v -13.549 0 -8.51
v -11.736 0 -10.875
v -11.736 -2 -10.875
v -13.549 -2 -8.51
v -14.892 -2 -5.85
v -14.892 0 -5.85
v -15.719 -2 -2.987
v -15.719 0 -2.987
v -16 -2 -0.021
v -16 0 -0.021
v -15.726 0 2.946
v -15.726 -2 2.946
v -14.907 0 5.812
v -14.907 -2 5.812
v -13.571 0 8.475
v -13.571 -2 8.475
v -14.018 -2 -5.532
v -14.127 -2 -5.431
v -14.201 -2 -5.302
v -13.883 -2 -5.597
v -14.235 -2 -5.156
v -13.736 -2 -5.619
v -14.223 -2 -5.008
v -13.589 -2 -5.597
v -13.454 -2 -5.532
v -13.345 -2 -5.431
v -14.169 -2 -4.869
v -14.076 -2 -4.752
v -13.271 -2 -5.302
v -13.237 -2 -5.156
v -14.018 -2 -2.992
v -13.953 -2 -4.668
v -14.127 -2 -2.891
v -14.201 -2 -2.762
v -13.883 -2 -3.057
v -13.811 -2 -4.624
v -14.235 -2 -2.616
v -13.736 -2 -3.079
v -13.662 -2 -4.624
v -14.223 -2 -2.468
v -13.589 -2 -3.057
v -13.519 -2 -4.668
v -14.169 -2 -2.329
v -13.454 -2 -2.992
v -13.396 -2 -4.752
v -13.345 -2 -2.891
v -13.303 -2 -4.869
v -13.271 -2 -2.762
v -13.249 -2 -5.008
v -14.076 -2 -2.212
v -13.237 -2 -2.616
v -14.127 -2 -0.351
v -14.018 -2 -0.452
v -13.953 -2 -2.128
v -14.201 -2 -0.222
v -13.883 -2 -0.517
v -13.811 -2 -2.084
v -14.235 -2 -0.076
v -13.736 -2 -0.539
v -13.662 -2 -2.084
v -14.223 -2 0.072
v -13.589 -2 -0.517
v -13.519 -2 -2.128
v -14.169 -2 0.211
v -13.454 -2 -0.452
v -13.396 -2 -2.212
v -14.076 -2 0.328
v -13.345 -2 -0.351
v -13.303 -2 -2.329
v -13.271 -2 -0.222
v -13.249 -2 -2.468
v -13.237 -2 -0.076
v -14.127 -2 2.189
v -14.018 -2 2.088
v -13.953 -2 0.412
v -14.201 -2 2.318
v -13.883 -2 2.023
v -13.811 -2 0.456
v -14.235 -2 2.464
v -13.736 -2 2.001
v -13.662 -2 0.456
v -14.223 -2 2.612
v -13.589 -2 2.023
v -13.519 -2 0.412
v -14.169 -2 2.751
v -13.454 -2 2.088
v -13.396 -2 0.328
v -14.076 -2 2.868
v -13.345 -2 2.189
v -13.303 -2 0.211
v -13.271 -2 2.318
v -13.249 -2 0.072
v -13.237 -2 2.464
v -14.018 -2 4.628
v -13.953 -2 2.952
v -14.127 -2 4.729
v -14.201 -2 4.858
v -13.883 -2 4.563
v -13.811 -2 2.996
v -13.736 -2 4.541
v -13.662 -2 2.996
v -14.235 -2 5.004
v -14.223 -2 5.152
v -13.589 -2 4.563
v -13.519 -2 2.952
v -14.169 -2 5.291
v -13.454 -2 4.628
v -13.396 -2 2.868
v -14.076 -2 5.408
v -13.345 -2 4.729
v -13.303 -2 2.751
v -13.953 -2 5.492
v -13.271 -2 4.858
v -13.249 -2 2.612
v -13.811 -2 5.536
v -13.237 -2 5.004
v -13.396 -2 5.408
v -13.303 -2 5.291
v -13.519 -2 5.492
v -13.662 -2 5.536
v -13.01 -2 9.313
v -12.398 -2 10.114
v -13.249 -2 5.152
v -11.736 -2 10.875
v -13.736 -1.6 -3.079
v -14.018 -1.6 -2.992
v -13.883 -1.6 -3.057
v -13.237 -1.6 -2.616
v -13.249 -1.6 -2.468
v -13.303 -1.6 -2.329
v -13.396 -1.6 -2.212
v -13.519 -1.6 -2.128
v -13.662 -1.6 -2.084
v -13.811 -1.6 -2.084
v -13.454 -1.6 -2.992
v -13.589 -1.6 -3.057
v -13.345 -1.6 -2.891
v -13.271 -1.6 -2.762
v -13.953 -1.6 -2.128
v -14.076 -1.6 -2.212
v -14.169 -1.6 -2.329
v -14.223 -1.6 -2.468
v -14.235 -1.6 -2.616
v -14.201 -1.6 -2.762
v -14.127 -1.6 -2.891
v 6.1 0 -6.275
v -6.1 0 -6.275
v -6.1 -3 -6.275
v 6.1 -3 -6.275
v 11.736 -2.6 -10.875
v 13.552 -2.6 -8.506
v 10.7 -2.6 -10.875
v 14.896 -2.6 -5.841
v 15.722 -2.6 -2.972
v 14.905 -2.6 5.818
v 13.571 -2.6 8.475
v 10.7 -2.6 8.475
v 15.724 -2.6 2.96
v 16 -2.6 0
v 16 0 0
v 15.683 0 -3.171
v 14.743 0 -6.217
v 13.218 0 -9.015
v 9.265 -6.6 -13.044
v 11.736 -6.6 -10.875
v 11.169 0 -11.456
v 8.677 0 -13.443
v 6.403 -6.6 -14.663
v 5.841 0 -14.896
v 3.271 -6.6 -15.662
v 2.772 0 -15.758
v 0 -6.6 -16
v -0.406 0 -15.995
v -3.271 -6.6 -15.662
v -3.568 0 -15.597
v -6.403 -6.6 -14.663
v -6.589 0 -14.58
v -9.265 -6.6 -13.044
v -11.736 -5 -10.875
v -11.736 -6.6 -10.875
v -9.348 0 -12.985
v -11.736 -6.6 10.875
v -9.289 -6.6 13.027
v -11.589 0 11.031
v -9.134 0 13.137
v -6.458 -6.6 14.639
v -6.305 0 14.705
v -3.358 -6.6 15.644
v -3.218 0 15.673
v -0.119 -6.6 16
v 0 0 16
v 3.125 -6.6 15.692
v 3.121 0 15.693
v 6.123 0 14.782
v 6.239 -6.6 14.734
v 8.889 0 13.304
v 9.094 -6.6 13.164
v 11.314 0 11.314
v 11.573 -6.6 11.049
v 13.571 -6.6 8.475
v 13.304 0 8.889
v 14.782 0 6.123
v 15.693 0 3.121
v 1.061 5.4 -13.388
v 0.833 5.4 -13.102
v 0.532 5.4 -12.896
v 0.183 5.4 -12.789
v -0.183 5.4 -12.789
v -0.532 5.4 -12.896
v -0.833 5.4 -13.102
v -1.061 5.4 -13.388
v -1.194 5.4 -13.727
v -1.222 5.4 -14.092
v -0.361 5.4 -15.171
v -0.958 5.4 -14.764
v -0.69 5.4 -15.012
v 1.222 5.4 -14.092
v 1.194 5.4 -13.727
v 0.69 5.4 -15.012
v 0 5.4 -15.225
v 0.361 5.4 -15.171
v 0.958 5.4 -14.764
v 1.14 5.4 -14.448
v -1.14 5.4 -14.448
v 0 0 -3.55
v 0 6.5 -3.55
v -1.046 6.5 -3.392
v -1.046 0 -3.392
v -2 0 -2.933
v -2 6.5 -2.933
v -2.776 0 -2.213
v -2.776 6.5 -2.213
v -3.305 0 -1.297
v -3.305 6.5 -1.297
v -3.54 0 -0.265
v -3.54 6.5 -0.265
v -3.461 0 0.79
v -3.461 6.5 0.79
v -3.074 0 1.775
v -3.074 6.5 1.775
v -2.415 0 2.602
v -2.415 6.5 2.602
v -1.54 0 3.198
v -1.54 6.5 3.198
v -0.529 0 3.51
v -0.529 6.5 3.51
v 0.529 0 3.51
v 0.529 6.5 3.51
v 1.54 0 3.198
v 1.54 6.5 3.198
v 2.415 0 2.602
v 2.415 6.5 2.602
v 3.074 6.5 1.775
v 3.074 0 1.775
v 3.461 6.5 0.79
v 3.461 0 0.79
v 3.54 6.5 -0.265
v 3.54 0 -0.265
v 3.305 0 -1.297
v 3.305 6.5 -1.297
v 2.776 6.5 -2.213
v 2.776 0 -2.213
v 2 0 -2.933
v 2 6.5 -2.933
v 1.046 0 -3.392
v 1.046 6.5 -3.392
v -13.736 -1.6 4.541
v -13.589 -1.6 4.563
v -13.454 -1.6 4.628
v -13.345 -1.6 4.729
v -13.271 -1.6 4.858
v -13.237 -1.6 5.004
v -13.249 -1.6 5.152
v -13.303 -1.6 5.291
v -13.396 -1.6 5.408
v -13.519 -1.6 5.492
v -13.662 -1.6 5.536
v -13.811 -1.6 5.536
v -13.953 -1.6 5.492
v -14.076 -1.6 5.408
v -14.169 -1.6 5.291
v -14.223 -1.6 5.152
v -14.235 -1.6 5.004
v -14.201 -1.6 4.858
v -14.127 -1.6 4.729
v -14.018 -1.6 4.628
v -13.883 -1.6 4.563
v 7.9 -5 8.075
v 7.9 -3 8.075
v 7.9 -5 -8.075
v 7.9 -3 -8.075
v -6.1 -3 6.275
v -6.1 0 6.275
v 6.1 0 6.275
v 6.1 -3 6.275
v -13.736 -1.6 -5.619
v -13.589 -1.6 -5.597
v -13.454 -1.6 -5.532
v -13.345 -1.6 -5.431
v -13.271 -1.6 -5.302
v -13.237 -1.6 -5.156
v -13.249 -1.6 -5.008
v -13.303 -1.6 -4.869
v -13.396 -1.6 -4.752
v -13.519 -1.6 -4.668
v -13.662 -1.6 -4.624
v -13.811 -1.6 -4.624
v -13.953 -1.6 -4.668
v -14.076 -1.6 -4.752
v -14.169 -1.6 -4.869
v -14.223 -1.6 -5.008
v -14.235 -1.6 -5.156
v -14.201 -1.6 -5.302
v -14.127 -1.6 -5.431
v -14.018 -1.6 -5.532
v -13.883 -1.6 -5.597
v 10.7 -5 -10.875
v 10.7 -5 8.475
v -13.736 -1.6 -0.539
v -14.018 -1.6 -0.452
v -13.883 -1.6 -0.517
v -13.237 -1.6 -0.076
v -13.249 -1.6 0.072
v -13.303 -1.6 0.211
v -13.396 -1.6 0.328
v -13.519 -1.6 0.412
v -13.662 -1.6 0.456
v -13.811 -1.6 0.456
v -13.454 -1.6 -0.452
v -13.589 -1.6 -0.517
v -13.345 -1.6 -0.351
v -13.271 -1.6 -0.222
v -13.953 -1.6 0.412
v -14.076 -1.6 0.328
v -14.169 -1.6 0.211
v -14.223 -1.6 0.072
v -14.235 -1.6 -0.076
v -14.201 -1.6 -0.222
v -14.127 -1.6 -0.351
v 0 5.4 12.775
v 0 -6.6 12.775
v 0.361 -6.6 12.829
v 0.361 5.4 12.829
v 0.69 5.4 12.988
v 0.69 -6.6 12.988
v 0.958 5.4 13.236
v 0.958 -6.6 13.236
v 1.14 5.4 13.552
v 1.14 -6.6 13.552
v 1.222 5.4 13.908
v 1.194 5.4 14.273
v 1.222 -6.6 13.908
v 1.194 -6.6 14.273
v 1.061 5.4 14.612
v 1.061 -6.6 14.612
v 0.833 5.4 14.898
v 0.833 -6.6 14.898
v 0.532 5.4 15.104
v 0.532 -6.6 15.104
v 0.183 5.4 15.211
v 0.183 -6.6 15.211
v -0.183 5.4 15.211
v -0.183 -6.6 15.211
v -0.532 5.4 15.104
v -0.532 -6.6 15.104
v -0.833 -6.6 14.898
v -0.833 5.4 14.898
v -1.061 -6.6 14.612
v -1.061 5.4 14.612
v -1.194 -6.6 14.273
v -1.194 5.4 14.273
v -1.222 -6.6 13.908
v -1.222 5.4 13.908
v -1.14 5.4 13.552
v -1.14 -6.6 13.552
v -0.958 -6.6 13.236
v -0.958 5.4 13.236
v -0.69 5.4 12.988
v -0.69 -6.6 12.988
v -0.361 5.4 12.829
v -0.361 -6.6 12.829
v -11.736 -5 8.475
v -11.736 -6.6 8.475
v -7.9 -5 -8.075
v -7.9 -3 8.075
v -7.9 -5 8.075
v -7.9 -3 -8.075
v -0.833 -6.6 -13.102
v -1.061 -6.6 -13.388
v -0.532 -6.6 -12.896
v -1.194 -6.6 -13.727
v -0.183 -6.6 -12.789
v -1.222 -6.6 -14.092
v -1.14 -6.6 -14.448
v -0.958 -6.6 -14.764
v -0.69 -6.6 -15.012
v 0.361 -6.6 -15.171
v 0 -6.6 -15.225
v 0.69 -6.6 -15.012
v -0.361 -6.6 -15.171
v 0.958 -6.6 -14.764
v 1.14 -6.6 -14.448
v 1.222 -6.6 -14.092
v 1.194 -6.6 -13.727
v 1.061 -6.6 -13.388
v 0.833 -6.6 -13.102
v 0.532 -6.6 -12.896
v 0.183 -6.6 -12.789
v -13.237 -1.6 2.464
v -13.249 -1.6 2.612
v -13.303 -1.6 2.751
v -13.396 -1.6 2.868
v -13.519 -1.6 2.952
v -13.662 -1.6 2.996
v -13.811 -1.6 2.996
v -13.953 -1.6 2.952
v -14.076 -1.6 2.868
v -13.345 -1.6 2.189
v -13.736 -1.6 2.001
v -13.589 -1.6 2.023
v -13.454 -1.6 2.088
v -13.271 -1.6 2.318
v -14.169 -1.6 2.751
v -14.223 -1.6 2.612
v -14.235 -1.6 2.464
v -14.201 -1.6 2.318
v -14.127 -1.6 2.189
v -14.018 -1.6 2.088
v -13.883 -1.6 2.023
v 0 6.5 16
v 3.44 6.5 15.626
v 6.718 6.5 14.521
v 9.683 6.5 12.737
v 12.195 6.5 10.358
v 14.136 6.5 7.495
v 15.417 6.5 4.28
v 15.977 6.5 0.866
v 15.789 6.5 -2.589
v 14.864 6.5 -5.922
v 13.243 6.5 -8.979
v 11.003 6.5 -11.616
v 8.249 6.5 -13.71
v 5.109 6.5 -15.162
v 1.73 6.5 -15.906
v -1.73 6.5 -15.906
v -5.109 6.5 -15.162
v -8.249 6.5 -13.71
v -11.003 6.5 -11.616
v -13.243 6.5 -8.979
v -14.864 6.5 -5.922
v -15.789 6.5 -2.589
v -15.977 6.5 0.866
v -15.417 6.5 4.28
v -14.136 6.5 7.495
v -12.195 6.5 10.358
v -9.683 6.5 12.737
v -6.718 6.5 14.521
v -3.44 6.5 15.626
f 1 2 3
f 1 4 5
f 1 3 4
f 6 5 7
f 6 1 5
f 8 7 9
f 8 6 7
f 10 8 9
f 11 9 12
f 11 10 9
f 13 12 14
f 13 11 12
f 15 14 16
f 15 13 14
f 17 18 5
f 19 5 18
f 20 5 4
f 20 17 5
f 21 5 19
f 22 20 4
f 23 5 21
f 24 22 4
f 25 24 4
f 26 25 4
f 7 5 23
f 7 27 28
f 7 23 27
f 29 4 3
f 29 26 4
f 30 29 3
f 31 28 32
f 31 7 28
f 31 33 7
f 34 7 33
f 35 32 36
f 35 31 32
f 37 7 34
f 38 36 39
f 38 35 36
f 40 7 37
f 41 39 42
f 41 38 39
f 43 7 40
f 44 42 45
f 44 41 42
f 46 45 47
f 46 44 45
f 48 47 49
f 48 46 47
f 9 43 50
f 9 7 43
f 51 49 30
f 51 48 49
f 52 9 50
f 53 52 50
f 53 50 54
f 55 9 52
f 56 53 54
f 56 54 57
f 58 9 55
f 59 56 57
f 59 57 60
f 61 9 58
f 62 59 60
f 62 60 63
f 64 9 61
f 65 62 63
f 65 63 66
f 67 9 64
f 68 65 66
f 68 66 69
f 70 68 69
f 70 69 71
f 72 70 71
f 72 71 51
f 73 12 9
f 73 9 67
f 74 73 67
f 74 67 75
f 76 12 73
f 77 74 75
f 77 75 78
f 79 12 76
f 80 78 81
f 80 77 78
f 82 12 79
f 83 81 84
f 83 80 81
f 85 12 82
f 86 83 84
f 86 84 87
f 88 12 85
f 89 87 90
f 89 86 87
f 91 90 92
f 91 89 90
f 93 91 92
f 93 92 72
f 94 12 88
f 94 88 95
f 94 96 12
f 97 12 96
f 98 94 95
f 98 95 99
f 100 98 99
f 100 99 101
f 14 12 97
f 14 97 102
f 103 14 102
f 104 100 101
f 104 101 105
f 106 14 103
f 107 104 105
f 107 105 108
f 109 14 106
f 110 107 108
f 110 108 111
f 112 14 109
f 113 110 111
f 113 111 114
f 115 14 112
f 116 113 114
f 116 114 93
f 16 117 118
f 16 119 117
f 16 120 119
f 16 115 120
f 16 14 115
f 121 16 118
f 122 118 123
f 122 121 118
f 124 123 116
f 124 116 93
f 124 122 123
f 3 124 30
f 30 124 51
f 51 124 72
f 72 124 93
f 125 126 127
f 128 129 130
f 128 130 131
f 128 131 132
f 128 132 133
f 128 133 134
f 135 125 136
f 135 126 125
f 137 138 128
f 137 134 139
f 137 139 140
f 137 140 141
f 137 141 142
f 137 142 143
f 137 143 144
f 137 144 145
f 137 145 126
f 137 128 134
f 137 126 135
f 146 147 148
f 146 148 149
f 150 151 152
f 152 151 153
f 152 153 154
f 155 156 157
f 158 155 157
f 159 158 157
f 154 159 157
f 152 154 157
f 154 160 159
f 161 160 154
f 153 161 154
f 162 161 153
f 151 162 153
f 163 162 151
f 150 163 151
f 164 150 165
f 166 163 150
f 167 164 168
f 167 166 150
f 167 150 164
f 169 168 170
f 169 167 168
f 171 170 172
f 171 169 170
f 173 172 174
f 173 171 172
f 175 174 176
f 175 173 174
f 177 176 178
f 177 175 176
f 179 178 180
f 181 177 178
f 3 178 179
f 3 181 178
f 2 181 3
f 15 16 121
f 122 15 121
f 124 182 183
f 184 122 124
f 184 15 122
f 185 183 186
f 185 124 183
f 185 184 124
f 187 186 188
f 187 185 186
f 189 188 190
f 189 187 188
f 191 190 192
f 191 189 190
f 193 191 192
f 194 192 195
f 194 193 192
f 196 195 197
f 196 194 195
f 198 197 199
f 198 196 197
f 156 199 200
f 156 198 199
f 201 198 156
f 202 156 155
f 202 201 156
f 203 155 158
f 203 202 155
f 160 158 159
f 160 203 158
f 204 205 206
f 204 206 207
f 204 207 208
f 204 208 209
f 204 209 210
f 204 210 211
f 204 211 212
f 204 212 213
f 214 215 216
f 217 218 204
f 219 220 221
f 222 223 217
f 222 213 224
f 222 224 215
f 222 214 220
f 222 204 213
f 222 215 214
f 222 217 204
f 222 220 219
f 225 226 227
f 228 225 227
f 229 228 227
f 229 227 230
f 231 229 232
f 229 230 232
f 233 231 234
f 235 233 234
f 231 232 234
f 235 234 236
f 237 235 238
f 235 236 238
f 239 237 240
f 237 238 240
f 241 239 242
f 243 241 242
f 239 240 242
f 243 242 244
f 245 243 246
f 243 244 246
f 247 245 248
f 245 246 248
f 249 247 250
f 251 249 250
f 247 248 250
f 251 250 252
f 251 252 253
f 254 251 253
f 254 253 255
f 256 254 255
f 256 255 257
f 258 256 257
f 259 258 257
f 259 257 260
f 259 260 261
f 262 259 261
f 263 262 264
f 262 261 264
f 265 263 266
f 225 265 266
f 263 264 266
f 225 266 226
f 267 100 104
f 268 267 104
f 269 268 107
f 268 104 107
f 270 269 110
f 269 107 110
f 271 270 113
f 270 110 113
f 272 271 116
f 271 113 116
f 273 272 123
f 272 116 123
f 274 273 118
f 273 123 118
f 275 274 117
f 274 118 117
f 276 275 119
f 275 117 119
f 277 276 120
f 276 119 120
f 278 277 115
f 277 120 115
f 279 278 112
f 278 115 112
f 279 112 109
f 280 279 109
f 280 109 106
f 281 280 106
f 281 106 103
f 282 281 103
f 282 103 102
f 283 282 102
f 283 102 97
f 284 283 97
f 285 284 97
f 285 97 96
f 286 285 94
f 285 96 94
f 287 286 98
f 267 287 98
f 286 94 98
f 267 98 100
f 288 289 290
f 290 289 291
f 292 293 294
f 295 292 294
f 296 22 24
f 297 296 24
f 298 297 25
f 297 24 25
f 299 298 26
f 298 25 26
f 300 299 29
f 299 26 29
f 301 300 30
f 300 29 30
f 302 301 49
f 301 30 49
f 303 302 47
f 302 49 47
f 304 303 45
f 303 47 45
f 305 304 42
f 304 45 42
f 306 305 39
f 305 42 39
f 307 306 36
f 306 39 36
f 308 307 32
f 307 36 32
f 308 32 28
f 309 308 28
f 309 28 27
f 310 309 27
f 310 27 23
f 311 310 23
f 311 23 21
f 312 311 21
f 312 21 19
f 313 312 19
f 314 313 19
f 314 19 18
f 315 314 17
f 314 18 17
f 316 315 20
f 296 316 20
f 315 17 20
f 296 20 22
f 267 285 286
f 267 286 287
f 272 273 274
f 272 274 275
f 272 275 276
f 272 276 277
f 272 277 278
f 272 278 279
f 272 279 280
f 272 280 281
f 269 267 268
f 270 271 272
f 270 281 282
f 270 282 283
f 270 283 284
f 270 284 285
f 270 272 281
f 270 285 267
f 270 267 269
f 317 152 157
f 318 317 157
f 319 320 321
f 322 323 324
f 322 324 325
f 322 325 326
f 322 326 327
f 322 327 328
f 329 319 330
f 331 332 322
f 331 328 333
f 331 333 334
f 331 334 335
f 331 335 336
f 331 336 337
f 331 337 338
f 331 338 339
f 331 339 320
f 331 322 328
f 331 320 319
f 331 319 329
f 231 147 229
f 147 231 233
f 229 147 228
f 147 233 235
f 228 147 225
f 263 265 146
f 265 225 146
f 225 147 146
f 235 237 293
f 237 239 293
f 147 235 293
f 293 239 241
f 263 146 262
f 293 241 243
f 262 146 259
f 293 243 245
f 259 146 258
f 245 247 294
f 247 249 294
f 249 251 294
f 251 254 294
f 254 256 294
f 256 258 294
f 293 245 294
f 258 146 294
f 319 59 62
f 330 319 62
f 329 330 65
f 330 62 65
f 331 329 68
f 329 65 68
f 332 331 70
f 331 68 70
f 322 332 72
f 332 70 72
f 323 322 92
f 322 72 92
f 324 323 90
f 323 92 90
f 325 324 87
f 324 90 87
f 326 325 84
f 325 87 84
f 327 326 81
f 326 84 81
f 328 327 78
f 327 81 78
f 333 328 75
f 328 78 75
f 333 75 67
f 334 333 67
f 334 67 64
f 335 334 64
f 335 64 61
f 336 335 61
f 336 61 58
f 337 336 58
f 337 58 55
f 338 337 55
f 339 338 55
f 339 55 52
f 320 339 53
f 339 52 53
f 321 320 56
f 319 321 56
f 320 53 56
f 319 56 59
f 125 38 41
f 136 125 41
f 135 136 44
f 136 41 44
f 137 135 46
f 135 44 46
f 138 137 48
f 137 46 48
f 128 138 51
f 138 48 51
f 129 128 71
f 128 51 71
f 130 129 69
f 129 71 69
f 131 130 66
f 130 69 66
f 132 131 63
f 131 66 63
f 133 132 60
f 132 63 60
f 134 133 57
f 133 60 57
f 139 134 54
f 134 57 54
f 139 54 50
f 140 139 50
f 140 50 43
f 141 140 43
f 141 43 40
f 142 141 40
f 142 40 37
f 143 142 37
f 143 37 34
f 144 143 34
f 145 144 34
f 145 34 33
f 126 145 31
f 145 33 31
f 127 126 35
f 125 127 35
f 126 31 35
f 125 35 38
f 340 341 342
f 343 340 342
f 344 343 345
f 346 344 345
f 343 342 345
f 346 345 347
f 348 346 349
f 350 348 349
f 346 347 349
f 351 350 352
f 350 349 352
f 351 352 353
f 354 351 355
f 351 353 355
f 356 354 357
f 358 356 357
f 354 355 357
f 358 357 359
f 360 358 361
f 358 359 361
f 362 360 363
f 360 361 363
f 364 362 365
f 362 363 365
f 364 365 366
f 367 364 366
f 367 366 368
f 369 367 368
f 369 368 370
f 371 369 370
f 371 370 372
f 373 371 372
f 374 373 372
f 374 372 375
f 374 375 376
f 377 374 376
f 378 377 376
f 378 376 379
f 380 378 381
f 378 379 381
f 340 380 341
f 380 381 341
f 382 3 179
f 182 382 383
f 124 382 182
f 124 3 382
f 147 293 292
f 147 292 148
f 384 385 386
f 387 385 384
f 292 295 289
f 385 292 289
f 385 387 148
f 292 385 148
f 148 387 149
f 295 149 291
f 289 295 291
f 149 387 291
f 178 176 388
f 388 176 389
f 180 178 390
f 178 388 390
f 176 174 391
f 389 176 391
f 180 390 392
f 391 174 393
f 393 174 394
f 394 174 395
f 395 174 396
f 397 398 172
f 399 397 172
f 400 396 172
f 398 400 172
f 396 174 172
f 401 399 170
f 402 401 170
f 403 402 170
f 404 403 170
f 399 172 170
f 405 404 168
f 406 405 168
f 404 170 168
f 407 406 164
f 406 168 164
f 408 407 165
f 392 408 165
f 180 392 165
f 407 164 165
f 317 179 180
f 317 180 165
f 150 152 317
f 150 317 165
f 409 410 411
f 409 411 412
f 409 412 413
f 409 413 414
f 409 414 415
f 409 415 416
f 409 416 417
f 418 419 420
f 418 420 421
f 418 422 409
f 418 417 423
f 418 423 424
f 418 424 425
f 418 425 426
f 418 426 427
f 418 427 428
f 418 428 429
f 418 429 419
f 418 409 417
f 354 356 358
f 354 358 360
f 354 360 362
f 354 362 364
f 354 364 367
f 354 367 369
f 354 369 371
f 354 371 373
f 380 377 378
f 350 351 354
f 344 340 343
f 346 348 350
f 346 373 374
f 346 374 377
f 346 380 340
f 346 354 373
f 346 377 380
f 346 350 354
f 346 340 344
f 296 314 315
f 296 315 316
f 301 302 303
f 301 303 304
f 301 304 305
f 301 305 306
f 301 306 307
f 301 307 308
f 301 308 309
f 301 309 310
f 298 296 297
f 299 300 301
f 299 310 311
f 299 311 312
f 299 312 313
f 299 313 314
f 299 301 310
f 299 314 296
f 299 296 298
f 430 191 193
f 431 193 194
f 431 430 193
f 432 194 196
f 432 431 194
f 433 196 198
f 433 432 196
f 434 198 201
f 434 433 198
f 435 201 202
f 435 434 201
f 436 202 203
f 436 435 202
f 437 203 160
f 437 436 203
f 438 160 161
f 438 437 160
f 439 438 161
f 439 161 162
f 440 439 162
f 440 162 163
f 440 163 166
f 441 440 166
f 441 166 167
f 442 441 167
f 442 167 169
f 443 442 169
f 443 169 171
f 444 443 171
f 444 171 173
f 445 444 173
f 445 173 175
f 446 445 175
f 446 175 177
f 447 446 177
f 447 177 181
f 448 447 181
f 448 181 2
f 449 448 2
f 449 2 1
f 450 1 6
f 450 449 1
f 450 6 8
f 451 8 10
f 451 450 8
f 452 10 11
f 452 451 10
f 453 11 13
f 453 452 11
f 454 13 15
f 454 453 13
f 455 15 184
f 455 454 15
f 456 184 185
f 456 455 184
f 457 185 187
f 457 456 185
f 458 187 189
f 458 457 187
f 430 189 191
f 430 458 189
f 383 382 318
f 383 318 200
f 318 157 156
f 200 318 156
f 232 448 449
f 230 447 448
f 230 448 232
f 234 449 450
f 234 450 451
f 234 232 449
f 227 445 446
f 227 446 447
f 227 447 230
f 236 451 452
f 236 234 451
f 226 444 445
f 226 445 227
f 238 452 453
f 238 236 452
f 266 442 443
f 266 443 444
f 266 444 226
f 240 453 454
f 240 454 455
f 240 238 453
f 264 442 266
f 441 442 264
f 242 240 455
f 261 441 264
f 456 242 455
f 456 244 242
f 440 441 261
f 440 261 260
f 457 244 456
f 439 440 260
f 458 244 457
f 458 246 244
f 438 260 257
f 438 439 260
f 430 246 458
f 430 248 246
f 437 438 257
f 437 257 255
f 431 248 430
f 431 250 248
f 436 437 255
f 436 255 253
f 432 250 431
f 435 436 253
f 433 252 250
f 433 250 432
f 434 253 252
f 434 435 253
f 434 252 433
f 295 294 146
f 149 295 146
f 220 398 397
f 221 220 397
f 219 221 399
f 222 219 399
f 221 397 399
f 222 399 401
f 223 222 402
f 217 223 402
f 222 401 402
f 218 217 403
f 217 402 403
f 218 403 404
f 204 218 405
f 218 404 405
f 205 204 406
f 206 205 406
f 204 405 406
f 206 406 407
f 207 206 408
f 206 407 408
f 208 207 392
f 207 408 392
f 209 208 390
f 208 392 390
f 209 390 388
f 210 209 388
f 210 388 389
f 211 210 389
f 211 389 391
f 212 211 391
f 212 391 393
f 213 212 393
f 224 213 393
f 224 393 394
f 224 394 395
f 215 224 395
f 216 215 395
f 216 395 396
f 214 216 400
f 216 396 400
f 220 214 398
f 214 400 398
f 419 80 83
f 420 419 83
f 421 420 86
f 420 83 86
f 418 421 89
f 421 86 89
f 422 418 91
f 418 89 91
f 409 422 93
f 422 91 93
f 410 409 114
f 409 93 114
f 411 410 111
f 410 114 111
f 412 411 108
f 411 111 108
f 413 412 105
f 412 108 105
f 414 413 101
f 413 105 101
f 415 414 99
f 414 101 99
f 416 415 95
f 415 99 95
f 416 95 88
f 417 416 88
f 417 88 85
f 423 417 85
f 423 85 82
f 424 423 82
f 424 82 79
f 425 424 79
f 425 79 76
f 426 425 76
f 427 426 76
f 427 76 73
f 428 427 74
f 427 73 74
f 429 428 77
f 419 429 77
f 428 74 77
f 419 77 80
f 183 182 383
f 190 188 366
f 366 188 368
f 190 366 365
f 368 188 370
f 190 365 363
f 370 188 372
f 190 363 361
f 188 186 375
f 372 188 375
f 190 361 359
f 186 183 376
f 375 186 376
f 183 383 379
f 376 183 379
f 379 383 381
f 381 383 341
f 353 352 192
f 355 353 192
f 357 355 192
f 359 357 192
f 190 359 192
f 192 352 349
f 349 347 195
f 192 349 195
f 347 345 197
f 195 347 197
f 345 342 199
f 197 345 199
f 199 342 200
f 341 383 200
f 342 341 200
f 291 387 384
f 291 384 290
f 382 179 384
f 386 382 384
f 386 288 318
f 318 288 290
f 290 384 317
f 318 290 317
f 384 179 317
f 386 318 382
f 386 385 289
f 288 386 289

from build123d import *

# Parameters (mm, degrees)
SKETCH1_W           = 15.8
SKETCH1_H           = 16.15
SKETCH1_W_2         = 12.2
SKETCH1_H_2         = 12.55
BOSS_EXTRUDE1_DEPTH = 3
SKETCH1_3_W         = 15.8
SKETCH1_3_H         = 16.15
BOSS_EXTRUDE2_DEPTH = 5
BOSS_EXTRUDE3_DEPTH = 6.6
BOSS_EXTRUDE4_START = 6.5
SKETCH1_5_R         = 16
SKETCH1_5_R_2       = 3.55
BOSS_EXTRUDE4_DEPTH = 6.5
SKETCH2_R           = 1.225
CUT_EXTRUDE1_DEPTH  = 12
CUT_EXTRUDE2_START  = -4.6
CUT_EXTRUDE2_DEPTH  = 4.6
CUT_EXTRUDE3_START  = -4
CUT_EXTRUDE3_DEPTH  = 4
SKETCH5_R           = 0.5
CUT_EXTRUDE4_DEPTH  = 0.4


with BuildPart() as part:
    # Sketch1 → Boss-Extrude1 (new body)
    with BuildSketch(Plane(origin=(0, 0, 0), x_dir=(1, 0, 0), z_dir=(0, 1, 0))):
        Rectangle(SKETCH1_W, SKETCH1_H)
        Rectangle(SKETCH1_W_2, SKETCH1_H_2, mode=Mode.SUBTRACT)
    extrude(amount=-BOSS_EXTRUDE1_DEPTH)

    # Sketch1<3> → Boss-Extrude2 (add)
    with BuildSketch(Plane(origin=(0, 0, 0), x_dir=(1, 0, 0), z_dir=(0, 1, 0))):
        with BuildLine():
            Line((10.7, 10.875), (-11.736028928, 10.875))
            ThreePointArc((-11.736028928, 10.875), (-15.928532305, 1.510582208), (-13.571085992, -8.475))
            Line((-13.571085992, -8.475), (10.7, -8.475))
            Line((10.7, -8.475), (10.7, 10.875))
        make_face()
        Rectangle(SKETCH1_3_W, SKETCH1_3_H, mode=Mode.SUBTRACT)
    extrude(amount=-BOSS_EXTRUDE2_DEPTH)

    # Sketch1<4> → Boss-Extrude3 (add)
    with BuildSketch(Plane(origin=(0, 0, 0), x_dir=(1, 0, 0), z_dir=(0, 1, 0))):
        with BuildLine():
            ThreePointArc((16, 0), (5.840528108, 14.895913246), (-11.736028928, 10.875))
            Line((-11.736028928, 10.875), (10.7, 10.875))
            Line((10.7, 10.875), (10.7, -8.475))
            Line((10.7, -8.475), (-13.571085992, -8.475))
            ThreePointArc((-13.571085992, -8.475), (4.408096195, -15.380789575), (16, 0))
        make_face()
    extrude(amount=-BOSS_EXTRUDE3_DEPTH)

    # Sketch1<5> → Boss-Extrude4 (add)
    with BuildSketch(Plane(origin=(0, 0, 0), x_dir=(1, 0, 0), z_dir=(0, 1, 0)).offset(BOSS_EXTRUDE4_START)):
        with Locations(Location((0, 0, 0), (0, 0, 270))):
            Circle(SKETCH1_5_R)
        with Locations(Location((0, 0, 0), (0, 0, 90))):
            Circle(SKETCH1_5_R_2, mode=Mode.SUBTRACT)
    extrude(amount=-BOSS_EXTRUDE4_DEPTH)

    # Sketch2 → Cut-Extrude1 (cut)
    with BuildSketch(Plane.XZ.offset(6.6)):
        with Locations(Location((0, 14, 0), (0, 0, 270))):
            Circle(SKETCH2_R)
        with Locations(Location((0, -14, 0), (0, 0, 270))):
            Circle(SKETCH2_R)
    extrude(amount=-CUT_EXTRUDE1_DEPTH, mode=Mode.SUBTRACT)

    # Sketch3 → Cut-Extrude2 (cut)
    with BuildSketch(Plane.XZ.offset(6.6).offset(CUT_EXTRUDE2_START)):
        with BuildLine():
            Line((-11.736028928, -10.875), (-11.736028928, 10.875))
            ThreePointArc((-11.736028928, 10.875), (-12.710331089, 9.71840952), (-13.571085992, 8.475))
            ThreePointArc((-13.571085992, 8.475), (-15.928532305, -1.510582208), (-11.736028928, -10.875))
        make_face()
    extrude(amount=CUT_EXTRUDE2_DEPTH, mode=Mode.SUBTRACT)

    # Sketch4 → Cut-Extrude3 (cut)
    with BuildSketch(Plane.XZ.offset(6.6).offset(CUT_EXTRUDE3_START)):
        with BuildLine():
            Line((10.7, 8.475), (13.571085992, 8.475))
            ThreePointArc((13.571085992, 8.475), (15.928532305, -1.510582208), (11.736028928, -10.875))
            Line((11.736028928, -10.875), (10.7, -10.875))
            Line((10.7, -10.875), (10.7, 8.475))
        make_face()
    extrude(amount=CUT_EXTRUDE3_DEPTH, mode=Mode.SUBTRACT)

    # Sketch5 → Cut-Extrude4 (cut)
    with BuildSketch(Plane.XZ.offset(2)):
        with Locations(Location((-13.736028928, 5.041127606, 0), (0, 0, 270))):
            Circle(SKETCH5_R)
        with Locations(Location((-13.736028928, 2.501127606, 0), (0, 0, 270))):
            Circle(SKETCH5_R)
        with Locations(Location((-13.736028928, -0.038872394, 0), (0, 0, 270))):
            Circle(SKETCH5_R)
        with Locations(Location((-13.736028928, -2.578872394, 0), (0, 0, 270))):
            Circle(SKETCH5_R)
        with Locations(Location((-13.736028928, -5.118872394, 0), (0, 0, 270))):
            Circle(SKETCH5_R)
    extrude(amount=-CUT_EXTRUDE4_DEPTH, mode=Mode.SUBTRACT)


solid = part.part
